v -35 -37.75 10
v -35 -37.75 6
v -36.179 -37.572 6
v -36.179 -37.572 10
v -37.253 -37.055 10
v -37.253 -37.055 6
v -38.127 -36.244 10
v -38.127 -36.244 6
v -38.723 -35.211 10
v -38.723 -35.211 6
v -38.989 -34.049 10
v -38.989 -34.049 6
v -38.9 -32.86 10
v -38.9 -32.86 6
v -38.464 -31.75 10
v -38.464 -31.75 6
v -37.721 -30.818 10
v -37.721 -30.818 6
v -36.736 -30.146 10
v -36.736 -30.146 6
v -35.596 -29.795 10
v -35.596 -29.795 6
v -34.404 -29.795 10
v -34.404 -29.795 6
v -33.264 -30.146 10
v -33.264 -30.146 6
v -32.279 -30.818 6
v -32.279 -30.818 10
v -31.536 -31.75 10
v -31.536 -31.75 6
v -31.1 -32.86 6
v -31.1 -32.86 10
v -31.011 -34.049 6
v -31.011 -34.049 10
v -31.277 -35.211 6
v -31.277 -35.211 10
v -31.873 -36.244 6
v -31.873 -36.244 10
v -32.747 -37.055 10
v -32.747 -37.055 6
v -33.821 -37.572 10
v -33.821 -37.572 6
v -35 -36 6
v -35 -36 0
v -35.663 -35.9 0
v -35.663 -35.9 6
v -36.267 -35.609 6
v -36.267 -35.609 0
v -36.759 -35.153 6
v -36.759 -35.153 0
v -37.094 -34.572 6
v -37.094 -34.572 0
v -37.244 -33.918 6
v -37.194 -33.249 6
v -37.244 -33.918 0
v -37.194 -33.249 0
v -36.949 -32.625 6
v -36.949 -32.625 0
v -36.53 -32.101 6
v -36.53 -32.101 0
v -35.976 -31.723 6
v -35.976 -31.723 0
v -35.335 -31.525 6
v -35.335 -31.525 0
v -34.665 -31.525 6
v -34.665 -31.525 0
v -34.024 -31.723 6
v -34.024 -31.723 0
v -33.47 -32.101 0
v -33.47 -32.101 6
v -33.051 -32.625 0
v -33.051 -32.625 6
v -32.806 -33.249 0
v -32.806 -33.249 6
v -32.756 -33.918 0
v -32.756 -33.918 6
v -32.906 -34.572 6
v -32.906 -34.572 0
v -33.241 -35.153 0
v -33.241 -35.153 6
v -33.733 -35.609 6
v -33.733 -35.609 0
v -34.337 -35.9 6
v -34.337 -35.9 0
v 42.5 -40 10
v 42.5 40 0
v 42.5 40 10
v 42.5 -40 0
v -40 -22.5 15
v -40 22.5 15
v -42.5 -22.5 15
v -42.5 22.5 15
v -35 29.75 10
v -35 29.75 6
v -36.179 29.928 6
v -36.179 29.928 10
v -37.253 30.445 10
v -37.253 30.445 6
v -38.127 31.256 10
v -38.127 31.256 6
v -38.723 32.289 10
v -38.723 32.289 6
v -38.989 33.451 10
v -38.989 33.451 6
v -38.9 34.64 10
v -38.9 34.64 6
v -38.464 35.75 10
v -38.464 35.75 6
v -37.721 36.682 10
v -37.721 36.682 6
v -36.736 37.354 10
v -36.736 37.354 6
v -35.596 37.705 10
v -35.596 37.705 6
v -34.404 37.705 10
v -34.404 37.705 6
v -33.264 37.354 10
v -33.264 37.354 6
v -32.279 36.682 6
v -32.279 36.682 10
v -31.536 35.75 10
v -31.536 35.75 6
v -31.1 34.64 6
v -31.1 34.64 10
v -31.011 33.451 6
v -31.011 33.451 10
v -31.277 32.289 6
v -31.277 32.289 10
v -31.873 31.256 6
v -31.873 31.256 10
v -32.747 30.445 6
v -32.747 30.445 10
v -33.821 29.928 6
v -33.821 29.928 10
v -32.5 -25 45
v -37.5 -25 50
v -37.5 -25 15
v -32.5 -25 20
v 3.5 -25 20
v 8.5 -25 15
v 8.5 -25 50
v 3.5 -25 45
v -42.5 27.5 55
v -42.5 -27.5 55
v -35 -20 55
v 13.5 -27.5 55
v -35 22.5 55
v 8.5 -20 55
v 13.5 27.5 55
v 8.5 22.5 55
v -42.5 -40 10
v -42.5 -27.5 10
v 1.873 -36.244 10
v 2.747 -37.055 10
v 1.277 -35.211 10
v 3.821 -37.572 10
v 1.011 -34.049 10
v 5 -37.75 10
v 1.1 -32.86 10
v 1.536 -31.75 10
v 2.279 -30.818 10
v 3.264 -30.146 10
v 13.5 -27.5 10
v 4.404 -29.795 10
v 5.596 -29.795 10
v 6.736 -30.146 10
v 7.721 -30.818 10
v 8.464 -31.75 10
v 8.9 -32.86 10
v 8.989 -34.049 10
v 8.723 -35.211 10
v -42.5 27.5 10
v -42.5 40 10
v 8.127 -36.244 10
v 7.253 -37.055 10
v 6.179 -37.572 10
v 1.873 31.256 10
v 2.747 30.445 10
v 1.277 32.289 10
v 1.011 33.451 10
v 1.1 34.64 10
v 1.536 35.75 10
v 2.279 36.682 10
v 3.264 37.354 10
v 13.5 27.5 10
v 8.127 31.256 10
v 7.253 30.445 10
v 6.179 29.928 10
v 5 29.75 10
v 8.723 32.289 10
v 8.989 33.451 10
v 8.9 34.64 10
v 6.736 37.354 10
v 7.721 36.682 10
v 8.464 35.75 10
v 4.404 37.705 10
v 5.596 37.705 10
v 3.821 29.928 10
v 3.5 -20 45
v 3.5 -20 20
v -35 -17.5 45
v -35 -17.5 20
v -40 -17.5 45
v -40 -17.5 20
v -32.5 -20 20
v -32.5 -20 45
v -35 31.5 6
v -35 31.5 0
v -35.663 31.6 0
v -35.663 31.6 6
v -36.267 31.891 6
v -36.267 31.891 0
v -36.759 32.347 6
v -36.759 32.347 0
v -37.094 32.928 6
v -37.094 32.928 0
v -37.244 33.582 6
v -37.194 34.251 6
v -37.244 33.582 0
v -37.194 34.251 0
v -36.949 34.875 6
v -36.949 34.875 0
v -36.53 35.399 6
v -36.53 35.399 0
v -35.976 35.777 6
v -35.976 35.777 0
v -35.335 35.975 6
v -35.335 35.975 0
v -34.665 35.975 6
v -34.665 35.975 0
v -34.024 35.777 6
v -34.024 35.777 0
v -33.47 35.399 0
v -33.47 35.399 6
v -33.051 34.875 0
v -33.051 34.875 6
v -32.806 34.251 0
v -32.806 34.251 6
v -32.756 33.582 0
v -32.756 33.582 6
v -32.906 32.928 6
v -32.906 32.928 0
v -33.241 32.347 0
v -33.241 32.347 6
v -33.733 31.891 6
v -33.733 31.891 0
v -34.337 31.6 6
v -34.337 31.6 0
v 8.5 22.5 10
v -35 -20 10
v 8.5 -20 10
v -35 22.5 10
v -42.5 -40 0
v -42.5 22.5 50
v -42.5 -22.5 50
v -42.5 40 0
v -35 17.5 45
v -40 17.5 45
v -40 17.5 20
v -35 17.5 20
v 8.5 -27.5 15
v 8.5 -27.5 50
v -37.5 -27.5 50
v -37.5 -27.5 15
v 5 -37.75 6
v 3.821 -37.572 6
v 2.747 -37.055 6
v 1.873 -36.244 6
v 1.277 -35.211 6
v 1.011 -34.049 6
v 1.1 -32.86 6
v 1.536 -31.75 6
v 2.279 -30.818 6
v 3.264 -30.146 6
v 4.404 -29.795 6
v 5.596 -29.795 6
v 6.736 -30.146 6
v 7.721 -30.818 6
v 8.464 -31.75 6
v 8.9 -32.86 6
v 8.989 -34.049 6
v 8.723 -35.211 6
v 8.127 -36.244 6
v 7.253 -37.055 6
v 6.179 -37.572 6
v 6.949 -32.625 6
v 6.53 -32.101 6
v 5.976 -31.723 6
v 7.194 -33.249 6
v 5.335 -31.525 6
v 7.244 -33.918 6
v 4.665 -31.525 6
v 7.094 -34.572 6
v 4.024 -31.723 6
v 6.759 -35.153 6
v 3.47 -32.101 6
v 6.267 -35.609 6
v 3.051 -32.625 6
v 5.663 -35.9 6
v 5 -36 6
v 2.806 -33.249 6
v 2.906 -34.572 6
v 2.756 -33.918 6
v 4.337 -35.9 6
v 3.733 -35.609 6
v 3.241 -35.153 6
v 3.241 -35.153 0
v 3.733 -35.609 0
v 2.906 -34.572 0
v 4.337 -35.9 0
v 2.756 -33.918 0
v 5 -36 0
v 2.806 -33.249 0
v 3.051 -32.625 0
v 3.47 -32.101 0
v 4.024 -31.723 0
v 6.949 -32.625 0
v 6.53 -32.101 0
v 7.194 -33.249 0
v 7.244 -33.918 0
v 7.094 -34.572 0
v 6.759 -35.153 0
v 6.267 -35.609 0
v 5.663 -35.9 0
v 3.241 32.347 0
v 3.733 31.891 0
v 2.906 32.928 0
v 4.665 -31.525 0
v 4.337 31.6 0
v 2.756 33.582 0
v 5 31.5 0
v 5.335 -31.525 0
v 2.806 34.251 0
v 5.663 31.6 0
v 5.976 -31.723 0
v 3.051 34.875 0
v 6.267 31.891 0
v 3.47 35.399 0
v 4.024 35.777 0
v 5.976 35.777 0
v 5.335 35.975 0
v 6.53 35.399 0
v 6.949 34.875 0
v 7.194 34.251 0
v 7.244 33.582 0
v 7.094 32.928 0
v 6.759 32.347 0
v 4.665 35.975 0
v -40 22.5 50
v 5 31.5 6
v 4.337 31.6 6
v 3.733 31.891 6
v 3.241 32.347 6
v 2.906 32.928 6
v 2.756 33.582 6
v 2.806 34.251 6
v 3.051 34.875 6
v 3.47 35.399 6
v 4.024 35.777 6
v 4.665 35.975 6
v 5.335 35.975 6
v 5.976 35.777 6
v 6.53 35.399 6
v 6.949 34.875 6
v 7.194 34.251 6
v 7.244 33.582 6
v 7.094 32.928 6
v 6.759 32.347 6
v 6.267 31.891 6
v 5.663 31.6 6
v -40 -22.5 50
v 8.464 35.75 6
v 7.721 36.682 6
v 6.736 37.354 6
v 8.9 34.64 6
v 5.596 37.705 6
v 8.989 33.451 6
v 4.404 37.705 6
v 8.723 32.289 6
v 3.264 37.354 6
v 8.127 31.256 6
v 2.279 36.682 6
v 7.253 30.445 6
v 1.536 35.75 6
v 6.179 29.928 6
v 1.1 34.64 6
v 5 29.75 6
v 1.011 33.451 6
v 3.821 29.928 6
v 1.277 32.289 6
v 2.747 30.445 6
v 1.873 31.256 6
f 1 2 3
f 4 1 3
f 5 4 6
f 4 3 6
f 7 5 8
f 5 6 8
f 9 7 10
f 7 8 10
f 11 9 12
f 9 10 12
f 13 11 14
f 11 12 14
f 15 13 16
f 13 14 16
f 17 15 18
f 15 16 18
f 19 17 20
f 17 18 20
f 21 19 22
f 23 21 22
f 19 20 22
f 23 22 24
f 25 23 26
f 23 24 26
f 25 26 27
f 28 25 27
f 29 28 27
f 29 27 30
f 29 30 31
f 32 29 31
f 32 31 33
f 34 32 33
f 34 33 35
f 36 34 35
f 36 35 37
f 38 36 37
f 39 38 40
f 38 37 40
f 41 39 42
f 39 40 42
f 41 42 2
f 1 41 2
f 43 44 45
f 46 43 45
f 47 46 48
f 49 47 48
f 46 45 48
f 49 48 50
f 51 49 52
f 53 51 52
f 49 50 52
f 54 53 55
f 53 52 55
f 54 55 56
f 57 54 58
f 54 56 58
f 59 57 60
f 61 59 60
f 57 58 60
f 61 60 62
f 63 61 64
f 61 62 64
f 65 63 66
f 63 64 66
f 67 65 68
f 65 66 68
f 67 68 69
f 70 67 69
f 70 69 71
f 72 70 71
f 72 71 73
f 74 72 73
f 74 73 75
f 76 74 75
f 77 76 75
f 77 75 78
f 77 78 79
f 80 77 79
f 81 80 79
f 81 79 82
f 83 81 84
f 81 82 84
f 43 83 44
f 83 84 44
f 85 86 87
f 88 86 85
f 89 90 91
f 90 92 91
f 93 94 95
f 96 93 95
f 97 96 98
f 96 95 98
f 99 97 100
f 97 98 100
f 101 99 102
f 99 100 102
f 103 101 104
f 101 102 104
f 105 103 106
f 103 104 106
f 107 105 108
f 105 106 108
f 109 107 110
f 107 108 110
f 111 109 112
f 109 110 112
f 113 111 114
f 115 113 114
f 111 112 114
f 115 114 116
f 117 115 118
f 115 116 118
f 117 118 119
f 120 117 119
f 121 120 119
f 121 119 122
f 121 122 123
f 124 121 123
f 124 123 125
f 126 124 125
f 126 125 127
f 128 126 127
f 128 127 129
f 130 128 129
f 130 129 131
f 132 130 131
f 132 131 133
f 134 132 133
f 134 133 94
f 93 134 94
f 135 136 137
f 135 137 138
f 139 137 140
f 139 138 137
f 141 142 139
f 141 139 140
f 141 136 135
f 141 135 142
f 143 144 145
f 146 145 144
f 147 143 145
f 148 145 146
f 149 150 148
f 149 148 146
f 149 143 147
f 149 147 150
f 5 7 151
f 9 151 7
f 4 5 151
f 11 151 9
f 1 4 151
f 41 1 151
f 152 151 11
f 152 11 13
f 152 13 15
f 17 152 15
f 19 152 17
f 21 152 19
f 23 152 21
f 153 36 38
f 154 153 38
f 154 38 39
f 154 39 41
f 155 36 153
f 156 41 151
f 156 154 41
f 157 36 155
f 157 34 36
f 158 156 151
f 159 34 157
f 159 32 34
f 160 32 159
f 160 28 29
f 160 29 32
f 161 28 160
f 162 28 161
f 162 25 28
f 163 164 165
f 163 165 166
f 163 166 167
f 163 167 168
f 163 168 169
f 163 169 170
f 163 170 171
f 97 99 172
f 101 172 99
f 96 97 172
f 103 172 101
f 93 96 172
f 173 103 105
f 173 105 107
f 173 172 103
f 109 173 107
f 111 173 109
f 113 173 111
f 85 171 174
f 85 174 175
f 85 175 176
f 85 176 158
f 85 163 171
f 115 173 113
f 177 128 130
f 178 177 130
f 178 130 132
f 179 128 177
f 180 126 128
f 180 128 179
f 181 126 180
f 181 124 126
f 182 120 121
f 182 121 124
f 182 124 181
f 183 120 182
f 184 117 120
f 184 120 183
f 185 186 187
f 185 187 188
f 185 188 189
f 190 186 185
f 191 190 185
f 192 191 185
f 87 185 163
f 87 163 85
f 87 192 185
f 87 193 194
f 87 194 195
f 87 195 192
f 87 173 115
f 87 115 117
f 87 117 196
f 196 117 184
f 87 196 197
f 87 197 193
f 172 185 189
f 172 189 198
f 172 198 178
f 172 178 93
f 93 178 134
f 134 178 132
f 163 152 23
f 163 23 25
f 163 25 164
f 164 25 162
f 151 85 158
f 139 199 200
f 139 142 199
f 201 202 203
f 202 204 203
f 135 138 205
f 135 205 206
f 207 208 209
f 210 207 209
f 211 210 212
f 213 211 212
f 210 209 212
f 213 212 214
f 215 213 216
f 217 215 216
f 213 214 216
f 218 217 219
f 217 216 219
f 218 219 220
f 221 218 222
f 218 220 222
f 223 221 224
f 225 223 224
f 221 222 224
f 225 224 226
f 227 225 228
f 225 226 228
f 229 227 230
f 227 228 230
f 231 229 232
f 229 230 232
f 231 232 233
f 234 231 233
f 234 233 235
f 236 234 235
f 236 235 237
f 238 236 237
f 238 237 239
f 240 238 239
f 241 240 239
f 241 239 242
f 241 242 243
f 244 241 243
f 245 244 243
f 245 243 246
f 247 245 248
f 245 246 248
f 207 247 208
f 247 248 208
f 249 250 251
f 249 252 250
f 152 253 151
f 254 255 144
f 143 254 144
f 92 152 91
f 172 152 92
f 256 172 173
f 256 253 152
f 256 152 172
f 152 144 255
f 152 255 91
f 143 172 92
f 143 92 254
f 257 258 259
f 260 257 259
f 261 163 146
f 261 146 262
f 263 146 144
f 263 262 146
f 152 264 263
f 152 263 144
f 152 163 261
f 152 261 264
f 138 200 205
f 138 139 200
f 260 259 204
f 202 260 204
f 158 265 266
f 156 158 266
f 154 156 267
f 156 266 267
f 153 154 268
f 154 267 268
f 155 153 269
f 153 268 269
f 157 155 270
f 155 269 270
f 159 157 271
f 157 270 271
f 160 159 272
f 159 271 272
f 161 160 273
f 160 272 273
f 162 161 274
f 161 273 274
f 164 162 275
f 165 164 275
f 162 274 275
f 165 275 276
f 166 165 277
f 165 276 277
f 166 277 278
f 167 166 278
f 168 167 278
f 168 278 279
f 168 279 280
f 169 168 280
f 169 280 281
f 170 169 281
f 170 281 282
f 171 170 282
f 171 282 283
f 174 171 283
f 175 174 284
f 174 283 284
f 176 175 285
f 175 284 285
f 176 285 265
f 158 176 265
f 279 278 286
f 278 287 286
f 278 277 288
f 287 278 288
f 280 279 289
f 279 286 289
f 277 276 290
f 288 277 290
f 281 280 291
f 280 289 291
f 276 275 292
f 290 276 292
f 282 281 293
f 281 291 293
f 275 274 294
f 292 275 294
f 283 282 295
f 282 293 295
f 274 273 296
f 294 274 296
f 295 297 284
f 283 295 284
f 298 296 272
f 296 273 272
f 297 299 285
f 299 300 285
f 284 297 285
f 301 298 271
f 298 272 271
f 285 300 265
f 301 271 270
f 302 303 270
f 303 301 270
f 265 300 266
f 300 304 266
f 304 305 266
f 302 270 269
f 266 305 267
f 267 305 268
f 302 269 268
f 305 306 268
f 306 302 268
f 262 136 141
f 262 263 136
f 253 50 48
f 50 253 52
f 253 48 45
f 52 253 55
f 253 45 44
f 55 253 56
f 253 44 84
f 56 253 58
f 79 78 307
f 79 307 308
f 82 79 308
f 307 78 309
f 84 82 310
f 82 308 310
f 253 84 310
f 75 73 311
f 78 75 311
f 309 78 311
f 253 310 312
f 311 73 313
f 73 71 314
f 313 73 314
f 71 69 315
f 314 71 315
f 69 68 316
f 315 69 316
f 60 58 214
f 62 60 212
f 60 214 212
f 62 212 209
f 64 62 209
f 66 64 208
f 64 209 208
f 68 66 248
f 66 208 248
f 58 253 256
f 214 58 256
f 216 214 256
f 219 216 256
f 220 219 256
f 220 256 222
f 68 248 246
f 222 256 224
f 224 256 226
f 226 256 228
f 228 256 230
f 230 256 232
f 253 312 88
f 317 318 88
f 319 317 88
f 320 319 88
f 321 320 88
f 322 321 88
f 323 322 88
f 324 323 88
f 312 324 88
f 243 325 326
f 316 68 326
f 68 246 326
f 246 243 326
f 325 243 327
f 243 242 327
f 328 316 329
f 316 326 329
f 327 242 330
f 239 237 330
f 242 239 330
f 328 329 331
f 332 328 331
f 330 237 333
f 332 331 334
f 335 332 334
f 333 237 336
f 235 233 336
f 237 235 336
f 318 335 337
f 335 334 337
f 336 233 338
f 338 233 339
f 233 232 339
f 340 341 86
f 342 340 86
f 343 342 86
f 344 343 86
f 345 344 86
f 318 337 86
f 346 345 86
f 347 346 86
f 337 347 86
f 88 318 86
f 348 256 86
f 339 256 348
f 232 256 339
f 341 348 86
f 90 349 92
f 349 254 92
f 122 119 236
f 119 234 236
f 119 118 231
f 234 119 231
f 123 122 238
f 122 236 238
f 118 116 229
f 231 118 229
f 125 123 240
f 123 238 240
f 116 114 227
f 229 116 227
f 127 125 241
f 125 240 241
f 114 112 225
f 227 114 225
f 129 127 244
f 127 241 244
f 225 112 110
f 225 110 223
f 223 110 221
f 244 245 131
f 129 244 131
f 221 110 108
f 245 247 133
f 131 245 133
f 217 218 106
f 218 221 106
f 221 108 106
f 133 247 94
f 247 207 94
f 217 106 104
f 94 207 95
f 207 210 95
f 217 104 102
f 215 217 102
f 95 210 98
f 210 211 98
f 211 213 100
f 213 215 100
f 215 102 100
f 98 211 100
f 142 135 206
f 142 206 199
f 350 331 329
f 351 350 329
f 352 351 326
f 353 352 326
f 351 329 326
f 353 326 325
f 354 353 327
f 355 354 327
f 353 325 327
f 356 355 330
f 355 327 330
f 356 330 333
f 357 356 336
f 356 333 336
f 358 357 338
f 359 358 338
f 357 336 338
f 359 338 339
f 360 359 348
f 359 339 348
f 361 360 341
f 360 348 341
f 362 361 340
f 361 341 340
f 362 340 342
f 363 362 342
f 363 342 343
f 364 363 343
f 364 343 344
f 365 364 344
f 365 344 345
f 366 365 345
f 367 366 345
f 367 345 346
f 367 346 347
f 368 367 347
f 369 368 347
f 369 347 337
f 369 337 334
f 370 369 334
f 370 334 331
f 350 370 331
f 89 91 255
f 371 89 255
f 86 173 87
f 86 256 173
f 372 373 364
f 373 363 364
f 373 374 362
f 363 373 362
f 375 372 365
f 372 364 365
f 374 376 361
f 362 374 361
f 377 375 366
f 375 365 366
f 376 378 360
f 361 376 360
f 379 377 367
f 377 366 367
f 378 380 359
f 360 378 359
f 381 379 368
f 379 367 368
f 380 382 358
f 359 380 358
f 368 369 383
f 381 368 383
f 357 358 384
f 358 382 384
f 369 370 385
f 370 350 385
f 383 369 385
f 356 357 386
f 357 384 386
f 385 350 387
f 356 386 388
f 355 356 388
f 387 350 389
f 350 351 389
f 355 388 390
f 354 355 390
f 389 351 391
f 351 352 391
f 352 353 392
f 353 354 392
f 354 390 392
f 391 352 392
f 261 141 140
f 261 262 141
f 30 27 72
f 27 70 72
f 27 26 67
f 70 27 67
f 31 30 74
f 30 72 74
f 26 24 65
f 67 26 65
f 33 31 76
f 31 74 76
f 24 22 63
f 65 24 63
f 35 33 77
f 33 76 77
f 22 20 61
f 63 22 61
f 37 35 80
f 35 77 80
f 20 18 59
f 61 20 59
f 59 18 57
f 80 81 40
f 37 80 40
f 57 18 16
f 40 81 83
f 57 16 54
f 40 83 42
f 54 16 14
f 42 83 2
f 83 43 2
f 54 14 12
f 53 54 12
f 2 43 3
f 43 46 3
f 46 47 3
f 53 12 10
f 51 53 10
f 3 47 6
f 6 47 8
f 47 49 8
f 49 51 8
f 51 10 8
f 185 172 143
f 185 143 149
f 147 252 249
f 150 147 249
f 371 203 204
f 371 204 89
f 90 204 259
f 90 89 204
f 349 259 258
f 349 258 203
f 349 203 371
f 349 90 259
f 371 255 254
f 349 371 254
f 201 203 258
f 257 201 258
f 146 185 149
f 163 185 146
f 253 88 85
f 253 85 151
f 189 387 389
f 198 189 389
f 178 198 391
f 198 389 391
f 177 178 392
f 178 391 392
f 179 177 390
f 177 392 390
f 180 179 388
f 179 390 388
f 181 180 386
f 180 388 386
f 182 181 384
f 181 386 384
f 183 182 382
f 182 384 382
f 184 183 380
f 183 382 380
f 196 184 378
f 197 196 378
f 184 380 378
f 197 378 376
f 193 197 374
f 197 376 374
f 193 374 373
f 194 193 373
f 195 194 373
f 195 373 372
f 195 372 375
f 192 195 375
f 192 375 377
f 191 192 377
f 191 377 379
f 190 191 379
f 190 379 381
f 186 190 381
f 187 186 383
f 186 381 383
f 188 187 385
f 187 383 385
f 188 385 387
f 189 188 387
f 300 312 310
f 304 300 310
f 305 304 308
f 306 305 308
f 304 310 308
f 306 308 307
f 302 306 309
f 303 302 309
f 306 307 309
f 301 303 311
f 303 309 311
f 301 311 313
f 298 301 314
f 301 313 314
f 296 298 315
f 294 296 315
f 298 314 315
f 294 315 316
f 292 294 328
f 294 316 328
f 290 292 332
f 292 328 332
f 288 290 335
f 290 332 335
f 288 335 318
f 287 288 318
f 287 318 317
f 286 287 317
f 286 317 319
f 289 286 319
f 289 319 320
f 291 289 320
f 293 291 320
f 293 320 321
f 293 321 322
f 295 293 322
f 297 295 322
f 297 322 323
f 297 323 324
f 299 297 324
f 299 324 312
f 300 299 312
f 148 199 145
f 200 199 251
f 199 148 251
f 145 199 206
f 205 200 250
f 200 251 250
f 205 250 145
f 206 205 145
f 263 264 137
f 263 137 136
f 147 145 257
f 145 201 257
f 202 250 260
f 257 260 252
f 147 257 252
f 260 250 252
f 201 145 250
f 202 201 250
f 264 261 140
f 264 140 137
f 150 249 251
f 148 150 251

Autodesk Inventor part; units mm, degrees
ref_plane "YZ Plane" through (0, 0, 0) normal (1, 0, 0) x (0, 1, 0)
ref_plane "XZ Plane" through (0, 0, 0) normal (0, 1, 0) x (-1, 0, 0)
ref_plane "XY Plane" through (0, 0, 0) normal (0, 0, 1) x (1, 0, 0)
sketch "Sketch1" plane through (0, 0, 0) normal (0, 0, 1) x (1, 0, 0)
  line L0 (-42.5, 40) -> (42.5, 40)
  line L1 (42.5, 40) -> (42.5, -40)
  line L2 (42.5, -40) -> (-42.5, -40)
  line L3 (-42.5, -40) -> (-42.5, 40)
  point P0 (0, 0)
  dimension "d0" = 85
  dimension "d1" = 42.5
  dimension "d2" = 80
  dimension "d3" = 40
extrude "Extrusion1" add sketch "Sketch1" along normal blind 10
sketch "Sketch2" plane through (0, 0, 10) normal (0, 0, 1) x (1, 0, 0)
  line L0 (-42.5, 40) -> (-42.5, -40) projected
  point P0 (0, 0)
  point P1 (-35, -33.75)
  point P2 (5, -33.75)
  point P3 (-35, 33.75)
  point P4 (5, 33.75)
  dimension "d6" = 40
  dimension "d7" = 67.5
  dimension "d8" = 33.75
  dimension "d9" = 7.5
hole "Hole1" at (-35, -33.75, 10) at (5, -33.75, 10) at (-35, 33.75, 10) at (5, 33.75, 10) direction (0, 0, -1) diameter 4.5 end through all counterbore diameter 8 counterbore depth 4 clearance for "Hex Head Cap Screw ISO 24017" size "M4" standard "ISO"
sketch "Sketch3" plane through (0, 0, 10) normal (0, 0, 1) x (1, 0, 0)
  line L0 (-42.5, 27.5) -> (13.5, 27.5)
  line L1 (13.5, 27.5) -> (13.5, -27.5)
  line L2 (13.5, -27.5) -> (-42.5, -27.5)
  line L3 (-42.5, -27.5) -> (-42.5, 27.5)
  line L4 (-42.5, 40) -> (-42.5, -40) projected
  line L5 (-35, 22.5) -> (8.5, 22.5)
  line L6 (8.5, 22.5) -> (8.5, -20)
  line L7 (8.5, -20) -> (-35, -20)
  line L8 (-35, -20) -> (-35, 22.5)
  point P0 (0, 0)
  dimension "d17" = 56
  dimension "d18" = 55
  dimension "d19" = 27.5
  dimension "d20" = 5
  dimension "d21" = 5
  dimension "d22" = 7.5
  dimension "d23" = 7.5
extrude "Extrusion2" add sketch "Sketch3" along normal blind 45
sketch "Sketch4" plane through (-42.5, -27.5, 10) normal (0, -1, 0) x (1, 0, 0)
  line L0 (5, 40) -> (51, 40)
  line L1 (51, 40) -> (51, 5)
  line L2 (51, 5) -> (5, 5)
  line L3 (5, 5) -> (5, 40)
  line L4 (0, 0) -> (0, 45) projected
  line L5 (56, 0) -> (56, 45) projected
  line L6 (51, 45) -> (7.5, 45) projected
  line L7 (0, 0) -> (85, 0) projected
  point P0 (42.5, -10)
  dimension "d27" = 5
  dimension "d28" = 5
  dimension "d29" = 5
  dimension "d30" = 5
extrude "Extrusion3" cut sketch "Sketch4" against normal blind 2.5
sketch "Sketch5" plane through (-42.5, -25, 10) normal (0, -1, 0) x (1, 0, 0)
  line L0 (10, 35) -> (46, 35)
  line L1 (46, 35) -> (46, 10)
  line L2 (46, 10) -> (10, 10)
  line L3 (10, 10) -> (10, 35)
  line L4 (5, 40) -> (51, 40) projected
  line L5 (5, 5) -> (5, 40) projected
  line L6 (51, 5) -> (5, 5) projected
  line L7 (51, 40) -> (51, 5) projected
  point P0 (42.5, -10)
  dimension "d33" = 5
  dimension "d34" = 5
  dimension "d35" = 5
  dimension "d36" = 5
extrude "Extrusion4" cut sketch "Sketch5" against normal up to surface (5 mm away) contours L0 L1 L2 L3
sketch "Sketch6" plane through (-42.5, -40, 0) normal (-1, 0, 0) x (0, 0, 1)
  line L0 (50, 62.5) -> (15, 62.5)
  line L1 (15, 62.5) -> (15, 17.5)
  line L2 (15, 17.5) -> (50, 17.5)
  line L3 (50, 17.5) -> (50, 62.5)
  line L4 (55, 67.5) -> (55, 12.5) projected
  line L5 (10, 67.5) -> (55, 67.5) projected
  line L6 (10, 80) -> (10, 67.5) projected
  line L7 (10, 12.5) -> (55, 12.5) projected
  point P0 (0, 40)
  dimension "d39" = 5
  dimension "d40" = 5
  dimension "d41" = 5
  dimension "d42" = 5
extrude "Extrusion5" cut sketch "Sketch6" against normal blind 2.5
sketch "Sketch7" plane through (-40, -40, 0) normal (-1, 0, 0) x (0, 0, 1)
  line L0 (45, 57.5) -> (20, 57.5)
  line L1 (20, 57.5) -> (20, 22.5)
  line L2 (20, 22.5) -> (45, 22.5)
  line L3 (45, 22.5) -> (45, 57.5)
  line L4 (50, 62.5) -> (50, 17.5) projected
  line L5 (50, 17.5) -> (15, 17.5) projected
  line L6 (15, 17.5) -> (15, 62.5) projected
  line L7 (15, 62.5) -> (50, 62.5) projected
  point P0 (0, 40)
  dimension "d45" = 5
  dimension "d46" = 5
  dimension "d47" = 5
  dimension "d48" = 5
extrude "Extrusion6" cut sketch "Sketch7" against normal up to surface (5 mm away) contours L3 L2 L1 L0
equation "\"d1\" = 0.5 * d0"
equation "\"d3\" = 0.5 * d2"
equation "\"d8\" = 0.5 * d7"
equation "\"d19\" = 0.5 * d18"
equation "\"d21\" = d20"
properties part number "sampleChamber_singlePiece"
